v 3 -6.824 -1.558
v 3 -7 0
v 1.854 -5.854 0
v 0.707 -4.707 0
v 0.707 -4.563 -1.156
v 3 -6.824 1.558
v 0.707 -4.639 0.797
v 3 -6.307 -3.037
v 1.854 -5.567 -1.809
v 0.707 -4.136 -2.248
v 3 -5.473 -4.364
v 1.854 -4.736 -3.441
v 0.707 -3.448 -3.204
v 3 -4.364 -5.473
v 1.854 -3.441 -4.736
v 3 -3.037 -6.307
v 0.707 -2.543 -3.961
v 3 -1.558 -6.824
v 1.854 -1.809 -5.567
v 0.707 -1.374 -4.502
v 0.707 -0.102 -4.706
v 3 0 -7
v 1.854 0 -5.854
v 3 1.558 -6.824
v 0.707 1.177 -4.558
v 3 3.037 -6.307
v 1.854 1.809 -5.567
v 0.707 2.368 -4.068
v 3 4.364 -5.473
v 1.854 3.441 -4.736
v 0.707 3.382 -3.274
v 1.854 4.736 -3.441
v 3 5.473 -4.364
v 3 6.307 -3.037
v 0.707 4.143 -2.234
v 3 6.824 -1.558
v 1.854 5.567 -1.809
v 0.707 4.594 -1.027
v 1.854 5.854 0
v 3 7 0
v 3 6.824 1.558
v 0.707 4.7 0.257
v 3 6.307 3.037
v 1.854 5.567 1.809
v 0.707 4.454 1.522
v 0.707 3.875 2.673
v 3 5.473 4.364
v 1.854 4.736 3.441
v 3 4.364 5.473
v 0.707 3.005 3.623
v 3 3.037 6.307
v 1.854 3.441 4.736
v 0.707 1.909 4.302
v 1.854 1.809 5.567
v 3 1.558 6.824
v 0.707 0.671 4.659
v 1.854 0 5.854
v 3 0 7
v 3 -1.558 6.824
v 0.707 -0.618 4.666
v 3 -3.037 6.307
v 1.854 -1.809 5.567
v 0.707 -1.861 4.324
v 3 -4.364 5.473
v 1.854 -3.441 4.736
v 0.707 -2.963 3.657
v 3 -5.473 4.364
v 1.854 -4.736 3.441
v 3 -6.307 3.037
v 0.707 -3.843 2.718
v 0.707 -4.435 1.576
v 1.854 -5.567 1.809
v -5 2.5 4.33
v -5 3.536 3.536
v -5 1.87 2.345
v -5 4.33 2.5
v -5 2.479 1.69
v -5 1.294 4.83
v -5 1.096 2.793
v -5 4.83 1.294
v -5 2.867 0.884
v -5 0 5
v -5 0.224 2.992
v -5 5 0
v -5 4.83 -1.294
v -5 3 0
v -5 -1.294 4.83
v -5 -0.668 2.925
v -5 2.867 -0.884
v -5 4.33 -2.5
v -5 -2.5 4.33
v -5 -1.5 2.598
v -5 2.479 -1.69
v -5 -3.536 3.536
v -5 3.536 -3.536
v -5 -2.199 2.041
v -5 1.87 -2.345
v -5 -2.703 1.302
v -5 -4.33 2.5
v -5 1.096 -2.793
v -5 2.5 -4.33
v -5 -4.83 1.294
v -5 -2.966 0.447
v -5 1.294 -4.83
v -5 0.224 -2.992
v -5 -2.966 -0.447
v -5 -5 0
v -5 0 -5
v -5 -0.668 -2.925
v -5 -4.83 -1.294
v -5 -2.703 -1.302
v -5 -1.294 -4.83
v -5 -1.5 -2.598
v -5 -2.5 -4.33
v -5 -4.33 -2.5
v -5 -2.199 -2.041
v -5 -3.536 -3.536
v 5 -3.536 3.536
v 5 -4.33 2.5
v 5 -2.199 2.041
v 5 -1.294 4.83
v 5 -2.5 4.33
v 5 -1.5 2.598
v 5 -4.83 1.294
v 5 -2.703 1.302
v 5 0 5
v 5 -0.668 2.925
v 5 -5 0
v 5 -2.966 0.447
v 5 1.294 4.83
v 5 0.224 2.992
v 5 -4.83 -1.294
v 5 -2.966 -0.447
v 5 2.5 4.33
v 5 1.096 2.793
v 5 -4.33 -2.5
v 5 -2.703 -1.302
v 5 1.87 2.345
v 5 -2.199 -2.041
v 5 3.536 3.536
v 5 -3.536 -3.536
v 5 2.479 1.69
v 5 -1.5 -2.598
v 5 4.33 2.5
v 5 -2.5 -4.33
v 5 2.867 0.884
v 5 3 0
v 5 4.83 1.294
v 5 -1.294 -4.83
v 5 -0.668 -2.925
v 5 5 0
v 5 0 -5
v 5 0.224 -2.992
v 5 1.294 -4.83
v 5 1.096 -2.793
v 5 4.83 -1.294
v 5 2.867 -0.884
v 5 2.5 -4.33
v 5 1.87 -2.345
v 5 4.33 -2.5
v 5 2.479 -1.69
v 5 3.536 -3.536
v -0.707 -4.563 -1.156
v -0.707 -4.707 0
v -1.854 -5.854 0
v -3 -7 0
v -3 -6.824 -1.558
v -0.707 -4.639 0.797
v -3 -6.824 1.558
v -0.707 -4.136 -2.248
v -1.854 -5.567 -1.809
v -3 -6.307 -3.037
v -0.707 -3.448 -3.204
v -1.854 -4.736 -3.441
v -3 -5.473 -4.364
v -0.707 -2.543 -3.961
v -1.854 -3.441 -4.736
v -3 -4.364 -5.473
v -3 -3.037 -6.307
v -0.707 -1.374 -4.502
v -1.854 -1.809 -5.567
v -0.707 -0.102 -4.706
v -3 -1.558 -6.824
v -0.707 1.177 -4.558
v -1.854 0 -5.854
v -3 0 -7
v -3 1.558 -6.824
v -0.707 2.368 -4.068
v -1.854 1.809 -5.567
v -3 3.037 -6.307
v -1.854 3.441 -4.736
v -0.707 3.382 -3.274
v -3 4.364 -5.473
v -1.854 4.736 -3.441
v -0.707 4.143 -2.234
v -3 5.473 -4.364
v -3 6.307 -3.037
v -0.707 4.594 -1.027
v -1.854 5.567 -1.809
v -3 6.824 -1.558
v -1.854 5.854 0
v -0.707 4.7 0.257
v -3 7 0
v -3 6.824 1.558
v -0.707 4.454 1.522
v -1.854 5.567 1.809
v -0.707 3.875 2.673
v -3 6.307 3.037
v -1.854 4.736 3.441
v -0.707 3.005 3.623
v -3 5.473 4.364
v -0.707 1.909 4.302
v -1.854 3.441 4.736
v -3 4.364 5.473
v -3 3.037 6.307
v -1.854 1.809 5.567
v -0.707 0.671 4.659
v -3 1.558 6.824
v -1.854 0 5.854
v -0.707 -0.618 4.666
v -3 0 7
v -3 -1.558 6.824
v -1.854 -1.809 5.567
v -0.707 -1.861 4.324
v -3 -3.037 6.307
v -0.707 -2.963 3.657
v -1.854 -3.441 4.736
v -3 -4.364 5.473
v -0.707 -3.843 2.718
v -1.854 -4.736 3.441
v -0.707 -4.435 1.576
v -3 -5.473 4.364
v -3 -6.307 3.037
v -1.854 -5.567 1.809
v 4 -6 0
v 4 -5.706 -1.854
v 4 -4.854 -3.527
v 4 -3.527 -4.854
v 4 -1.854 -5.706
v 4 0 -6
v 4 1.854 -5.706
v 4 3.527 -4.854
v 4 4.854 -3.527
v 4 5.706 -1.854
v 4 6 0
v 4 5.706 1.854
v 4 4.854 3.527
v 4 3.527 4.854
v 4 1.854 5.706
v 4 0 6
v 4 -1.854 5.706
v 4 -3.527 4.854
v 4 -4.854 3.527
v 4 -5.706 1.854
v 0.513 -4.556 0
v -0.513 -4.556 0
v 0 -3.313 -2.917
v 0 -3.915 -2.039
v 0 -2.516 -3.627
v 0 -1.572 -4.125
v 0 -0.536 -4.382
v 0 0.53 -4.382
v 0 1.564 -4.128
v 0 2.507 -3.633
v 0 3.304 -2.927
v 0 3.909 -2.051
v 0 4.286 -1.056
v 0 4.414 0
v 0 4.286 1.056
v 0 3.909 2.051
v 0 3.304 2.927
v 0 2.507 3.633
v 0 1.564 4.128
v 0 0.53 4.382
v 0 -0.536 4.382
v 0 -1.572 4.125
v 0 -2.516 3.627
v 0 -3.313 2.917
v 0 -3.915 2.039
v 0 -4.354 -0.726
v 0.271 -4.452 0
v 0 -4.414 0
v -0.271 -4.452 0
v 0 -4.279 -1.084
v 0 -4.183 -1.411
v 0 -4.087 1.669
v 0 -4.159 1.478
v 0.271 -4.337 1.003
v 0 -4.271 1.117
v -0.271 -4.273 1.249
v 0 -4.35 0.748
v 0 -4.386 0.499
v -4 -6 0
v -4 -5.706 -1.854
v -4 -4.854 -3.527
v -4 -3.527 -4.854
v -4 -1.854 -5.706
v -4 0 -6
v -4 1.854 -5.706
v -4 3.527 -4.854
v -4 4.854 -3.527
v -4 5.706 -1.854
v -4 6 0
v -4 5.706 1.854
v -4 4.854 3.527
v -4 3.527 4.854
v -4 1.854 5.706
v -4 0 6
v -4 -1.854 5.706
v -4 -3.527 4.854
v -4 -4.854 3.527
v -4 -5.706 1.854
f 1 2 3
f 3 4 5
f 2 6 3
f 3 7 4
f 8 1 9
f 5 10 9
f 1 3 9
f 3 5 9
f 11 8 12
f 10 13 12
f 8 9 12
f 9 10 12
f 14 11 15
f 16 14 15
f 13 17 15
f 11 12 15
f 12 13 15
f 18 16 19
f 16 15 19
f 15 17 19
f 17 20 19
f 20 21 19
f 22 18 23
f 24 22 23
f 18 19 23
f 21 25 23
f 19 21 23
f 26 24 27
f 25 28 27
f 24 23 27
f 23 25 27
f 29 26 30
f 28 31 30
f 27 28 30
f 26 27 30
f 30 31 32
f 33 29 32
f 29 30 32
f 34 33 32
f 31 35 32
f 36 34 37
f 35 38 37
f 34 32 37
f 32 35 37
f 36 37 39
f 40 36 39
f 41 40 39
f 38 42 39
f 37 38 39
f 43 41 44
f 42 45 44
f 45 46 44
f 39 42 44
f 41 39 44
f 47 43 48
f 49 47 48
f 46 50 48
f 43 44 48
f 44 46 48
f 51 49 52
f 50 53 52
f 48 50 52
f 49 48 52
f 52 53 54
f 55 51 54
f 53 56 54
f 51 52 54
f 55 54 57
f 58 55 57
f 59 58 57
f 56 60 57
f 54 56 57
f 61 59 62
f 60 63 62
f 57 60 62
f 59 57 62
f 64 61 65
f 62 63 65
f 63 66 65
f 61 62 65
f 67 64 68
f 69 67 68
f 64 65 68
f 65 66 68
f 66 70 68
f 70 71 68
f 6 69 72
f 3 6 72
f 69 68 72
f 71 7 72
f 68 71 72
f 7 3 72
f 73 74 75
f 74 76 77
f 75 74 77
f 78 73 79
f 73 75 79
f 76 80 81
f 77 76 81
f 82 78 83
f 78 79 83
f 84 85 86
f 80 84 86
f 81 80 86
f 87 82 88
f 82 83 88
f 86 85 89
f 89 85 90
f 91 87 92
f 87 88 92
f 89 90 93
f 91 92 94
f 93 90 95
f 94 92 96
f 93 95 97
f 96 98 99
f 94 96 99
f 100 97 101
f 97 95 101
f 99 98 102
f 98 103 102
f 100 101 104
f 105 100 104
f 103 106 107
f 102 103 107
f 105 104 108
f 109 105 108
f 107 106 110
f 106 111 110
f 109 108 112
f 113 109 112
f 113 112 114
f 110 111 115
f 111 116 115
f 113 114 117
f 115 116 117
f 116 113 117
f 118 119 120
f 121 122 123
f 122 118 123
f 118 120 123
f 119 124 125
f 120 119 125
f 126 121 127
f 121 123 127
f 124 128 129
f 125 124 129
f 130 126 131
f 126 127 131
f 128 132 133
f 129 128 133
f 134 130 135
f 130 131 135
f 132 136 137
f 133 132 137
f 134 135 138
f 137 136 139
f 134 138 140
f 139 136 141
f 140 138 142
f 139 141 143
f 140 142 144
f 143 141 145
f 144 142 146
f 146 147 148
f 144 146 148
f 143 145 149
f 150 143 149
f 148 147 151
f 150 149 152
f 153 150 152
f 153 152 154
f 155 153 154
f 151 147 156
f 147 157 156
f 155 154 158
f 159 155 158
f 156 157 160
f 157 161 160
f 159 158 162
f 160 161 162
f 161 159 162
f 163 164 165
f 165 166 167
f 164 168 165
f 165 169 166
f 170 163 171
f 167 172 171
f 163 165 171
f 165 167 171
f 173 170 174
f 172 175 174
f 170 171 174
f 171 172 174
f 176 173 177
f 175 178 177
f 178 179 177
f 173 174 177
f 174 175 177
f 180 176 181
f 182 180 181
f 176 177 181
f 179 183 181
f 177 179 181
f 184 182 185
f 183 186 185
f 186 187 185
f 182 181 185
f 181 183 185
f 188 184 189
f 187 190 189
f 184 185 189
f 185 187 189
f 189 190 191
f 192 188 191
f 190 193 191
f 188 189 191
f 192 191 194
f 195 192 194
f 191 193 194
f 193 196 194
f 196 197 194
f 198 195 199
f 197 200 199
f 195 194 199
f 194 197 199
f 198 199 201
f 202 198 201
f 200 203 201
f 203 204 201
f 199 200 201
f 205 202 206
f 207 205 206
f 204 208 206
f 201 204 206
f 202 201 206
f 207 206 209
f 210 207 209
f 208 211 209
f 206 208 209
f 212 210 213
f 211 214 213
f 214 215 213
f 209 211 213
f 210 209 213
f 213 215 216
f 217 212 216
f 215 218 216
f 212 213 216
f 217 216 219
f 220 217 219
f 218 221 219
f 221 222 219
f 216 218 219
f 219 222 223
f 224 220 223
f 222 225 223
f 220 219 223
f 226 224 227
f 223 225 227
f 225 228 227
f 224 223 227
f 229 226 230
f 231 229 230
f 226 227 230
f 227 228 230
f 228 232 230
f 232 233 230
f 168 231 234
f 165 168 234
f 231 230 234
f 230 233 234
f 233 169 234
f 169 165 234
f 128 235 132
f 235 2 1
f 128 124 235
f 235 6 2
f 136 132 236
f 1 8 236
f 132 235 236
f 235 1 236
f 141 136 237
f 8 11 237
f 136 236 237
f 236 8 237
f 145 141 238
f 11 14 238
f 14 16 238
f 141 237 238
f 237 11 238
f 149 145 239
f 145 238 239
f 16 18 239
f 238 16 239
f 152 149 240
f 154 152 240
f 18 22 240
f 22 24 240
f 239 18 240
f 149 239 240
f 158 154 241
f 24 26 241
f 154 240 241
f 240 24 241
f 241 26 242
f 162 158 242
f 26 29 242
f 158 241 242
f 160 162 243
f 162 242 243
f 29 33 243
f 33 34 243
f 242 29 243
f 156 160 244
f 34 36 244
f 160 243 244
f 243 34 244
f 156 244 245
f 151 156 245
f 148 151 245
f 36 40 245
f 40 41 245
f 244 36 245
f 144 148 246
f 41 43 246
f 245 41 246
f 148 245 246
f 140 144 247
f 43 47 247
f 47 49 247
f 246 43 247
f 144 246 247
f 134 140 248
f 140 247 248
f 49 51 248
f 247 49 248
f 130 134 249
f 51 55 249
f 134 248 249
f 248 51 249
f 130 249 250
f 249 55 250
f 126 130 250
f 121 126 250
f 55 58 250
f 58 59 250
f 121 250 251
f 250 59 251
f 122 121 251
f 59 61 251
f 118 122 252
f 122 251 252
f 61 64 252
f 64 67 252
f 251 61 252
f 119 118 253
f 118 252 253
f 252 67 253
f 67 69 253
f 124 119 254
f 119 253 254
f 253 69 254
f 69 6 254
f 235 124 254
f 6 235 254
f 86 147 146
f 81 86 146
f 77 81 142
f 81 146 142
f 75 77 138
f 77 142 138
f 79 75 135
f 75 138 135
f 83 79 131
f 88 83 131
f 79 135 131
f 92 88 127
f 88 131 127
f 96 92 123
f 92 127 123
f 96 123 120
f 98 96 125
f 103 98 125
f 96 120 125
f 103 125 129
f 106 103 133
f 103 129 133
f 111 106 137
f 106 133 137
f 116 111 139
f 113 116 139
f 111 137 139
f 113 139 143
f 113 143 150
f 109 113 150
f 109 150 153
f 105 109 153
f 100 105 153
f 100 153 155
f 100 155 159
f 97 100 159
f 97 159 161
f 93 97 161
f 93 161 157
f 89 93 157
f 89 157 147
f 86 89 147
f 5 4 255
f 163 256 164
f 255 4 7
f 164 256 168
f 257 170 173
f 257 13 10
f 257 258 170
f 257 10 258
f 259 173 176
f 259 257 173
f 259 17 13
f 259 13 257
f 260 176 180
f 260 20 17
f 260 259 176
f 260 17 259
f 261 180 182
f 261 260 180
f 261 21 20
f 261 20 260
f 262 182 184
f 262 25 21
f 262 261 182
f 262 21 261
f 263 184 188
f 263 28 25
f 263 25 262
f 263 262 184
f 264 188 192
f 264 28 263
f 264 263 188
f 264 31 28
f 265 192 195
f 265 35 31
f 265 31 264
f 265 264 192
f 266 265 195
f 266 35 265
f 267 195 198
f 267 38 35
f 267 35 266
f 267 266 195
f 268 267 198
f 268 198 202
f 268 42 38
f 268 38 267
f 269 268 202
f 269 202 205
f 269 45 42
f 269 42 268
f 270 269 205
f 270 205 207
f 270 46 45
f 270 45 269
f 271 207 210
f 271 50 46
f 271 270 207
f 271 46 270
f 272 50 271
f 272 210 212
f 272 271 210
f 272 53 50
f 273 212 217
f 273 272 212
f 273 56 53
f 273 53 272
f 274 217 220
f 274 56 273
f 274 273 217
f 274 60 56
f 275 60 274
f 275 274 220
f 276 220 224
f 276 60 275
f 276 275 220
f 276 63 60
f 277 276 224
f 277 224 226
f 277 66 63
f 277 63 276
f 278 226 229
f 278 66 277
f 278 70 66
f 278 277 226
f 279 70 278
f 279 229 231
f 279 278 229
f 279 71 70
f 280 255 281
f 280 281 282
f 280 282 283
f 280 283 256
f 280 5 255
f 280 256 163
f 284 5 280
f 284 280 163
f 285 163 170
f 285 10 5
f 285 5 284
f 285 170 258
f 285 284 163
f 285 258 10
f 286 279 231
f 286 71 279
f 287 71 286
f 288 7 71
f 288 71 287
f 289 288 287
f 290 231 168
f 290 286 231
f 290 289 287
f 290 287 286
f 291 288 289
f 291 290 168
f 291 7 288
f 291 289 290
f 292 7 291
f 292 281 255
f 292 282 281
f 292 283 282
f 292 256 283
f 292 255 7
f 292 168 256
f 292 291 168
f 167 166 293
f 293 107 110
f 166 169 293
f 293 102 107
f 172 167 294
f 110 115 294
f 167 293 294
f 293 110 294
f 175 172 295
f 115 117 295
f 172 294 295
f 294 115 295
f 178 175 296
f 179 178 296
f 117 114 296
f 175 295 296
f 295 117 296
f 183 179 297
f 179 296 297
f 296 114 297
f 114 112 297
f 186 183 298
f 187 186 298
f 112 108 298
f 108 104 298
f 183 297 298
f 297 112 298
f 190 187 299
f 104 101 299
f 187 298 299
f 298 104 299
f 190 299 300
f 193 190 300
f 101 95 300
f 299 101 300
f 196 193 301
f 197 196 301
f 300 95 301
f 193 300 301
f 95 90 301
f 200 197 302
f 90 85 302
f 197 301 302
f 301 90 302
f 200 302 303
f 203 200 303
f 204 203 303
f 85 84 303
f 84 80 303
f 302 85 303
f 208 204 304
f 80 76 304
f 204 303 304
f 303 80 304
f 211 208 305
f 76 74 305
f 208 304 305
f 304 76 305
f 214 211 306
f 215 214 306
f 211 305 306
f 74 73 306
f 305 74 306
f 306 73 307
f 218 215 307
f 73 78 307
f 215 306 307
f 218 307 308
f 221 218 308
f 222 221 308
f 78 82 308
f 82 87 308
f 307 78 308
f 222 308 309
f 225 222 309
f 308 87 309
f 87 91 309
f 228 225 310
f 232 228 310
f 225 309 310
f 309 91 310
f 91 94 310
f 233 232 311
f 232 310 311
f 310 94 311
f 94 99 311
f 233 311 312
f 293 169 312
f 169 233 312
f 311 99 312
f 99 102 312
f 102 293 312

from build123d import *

# Parameters (mm, degrees)
FILLET1_R          = 1
SKETCH2_R          = 3
CUT_EXTRUDE1_DEPTH = 15.071247379


with BuildPart() as part:
    # Sketch1 → Revolve1 (revolve)
    with BuildSketch(Plane.XY, mode=Mode.PRIVATE) as revolve1_sk:
        Polygon((5, 0), (5, 5), (3, 7), (0, 4), (-3, 7), (-5, 5), (-5, 0), align=None)
    revolve(revolve1_sk.sketch.rotate(Axis((-5, 0, 0), (1, 0, 0)), 180), axis=Axis((-5, 0, 0), (1, 0, 0)))

    # Fillet1
    fillet1_edges = [part.edges().sort_by_distance(p)[0] for p in [
        (0, 4, 0),
    ]]
    fillet(fillet1_edges, radius=FILLET1_R)

    # Sketch2 → Cut-Extrude1 (cut, through all)
    with BuildSketch(Plane(origin=(5, 0, 0), x_dir=(0, 0, -1), z_dir=(1, 0, 0))):
        with Locations(Location((0, 0, 0), (0, 0, 90))):
            Circle(SKETCH2_R)
    extrude(amount=-CUT_EXTRUDE1_DEPTH, mode=Mode.SUBTRACT)


solid = part.part
